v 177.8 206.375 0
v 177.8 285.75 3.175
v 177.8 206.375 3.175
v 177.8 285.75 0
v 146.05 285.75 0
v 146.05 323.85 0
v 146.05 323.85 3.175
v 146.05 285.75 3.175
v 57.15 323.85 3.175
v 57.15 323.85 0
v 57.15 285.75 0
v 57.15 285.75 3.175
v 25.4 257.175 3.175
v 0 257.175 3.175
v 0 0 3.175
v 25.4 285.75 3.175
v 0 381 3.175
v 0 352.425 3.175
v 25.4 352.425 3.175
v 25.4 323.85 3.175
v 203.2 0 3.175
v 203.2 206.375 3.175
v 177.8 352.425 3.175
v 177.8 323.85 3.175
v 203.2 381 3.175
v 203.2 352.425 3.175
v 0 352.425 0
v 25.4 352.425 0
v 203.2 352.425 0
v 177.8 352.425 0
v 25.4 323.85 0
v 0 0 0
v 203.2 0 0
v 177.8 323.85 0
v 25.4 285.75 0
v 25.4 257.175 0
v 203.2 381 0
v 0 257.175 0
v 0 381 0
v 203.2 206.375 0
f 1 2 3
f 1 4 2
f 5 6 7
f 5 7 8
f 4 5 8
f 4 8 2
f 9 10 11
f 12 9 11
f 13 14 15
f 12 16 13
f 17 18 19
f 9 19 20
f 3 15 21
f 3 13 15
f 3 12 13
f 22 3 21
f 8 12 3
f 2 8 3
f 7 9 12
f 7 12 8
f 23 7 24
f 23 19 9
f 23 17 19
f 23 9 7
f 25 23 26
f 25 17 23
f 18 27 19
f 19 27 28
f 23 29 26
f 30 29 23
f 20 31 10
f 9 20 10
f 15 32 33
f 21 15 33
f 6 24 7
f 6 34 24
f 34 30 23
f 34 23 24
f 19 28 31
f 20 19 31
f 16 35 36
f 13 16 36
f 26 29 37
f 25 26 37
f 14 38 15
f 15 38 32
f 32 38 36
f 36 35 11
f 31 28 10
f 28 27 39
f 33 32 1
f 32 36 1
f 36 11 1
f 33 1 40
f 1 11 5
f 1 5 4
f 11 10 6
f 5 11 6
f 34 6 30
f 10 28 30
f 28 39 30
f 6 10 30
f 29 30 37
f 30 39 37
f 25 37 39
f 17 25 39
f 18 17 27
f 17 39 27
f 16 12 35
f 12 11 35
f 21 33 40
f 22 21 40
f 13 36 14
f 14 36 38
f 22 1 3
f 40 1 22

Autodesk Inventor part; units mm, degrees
ref_plane "YZ Plane" through (0, 0, 0) normal (1, 0, 0) x (0, 1, 0)
ref_plane "XZ Plane" through (0, 0, 0) normal (0, 1, 0) x (-1, 0, 0)
ref_plane "XY Plane" through (0, 0, 0) normal (0, 0, 1) x (1, 0, 0)
sketch "Sketch1" plane through (0, 0, 0) normal (0, 0, 1) x (1, 0, 0)
  line L0 (0, 0) -> (203.2, 0)
  line L1 (203.2, 381) -> (0, 381)
  line L2 (203.2, 352.425) -> (177.8, 352.425)
  line L3 (177.8, 352.425) -> (177.8, 323.85)
  line L4 (177.8, 323.85) -> (146.05, 323.85)
  line L5 (146.05, 323.85) -> (146.05, 285.75)
  line L6 (146.05, 285.75) -> (177.8, 285.75)
  line L7 (177.8, 285.75) -> (177.8, 206.375)
  line L8 (177.8, 206.375) -> (203.2, 206.375)
  line L9 (0, 352.425) -> (25.4, 352.425)
  line L10 (25.4, 352.425) -> (25.4, 323.85)
  line L11 (25.4, 323.85) -> (57.15, 323.85)
  line L12 (57.15, 323.85) -> (57.15, 285.75)
  line L13 (57.15, 285.75) -> (25.4, 285.75)
  line L14 (25.4, 285.75) -> (25.4, 257.175)
  line L15 (25.4, 257.175) -> (0, 257.175)
  line L16 (203.2, 0) -> (203.2, 206.375)
  line L17 (203.2, 352.425) -> (203.2, 381)
  line L18 (0, 381) -> (0, 352.425)
  line L19 (0, 257.175) -> (0, 0)
  dimension "d0" = 203.2
  dimension "d1" = 381
  dimension "d4" = 25.4
  dimension "d5" = 28.575
  dimension "d6" = 31.75
  dimension "d7" = 38.1
  dimension "d8" = 79.375
  dimension "d9" = 28.575
  dimension "d10" = 25.4
  dimension "d11" = 28.575
  dimension "d12" = 31.75
  dimension "d13" = 38.1
  dimension "d14" = 31.75
  dimension "d15" = 28.575
  dimension "d16" = 28.575
extrude "Extrusion1" add sketch "Sketch1" along normal blind 3.175
properties part number "Collector Side" material "Polycarbonate, Clear"
